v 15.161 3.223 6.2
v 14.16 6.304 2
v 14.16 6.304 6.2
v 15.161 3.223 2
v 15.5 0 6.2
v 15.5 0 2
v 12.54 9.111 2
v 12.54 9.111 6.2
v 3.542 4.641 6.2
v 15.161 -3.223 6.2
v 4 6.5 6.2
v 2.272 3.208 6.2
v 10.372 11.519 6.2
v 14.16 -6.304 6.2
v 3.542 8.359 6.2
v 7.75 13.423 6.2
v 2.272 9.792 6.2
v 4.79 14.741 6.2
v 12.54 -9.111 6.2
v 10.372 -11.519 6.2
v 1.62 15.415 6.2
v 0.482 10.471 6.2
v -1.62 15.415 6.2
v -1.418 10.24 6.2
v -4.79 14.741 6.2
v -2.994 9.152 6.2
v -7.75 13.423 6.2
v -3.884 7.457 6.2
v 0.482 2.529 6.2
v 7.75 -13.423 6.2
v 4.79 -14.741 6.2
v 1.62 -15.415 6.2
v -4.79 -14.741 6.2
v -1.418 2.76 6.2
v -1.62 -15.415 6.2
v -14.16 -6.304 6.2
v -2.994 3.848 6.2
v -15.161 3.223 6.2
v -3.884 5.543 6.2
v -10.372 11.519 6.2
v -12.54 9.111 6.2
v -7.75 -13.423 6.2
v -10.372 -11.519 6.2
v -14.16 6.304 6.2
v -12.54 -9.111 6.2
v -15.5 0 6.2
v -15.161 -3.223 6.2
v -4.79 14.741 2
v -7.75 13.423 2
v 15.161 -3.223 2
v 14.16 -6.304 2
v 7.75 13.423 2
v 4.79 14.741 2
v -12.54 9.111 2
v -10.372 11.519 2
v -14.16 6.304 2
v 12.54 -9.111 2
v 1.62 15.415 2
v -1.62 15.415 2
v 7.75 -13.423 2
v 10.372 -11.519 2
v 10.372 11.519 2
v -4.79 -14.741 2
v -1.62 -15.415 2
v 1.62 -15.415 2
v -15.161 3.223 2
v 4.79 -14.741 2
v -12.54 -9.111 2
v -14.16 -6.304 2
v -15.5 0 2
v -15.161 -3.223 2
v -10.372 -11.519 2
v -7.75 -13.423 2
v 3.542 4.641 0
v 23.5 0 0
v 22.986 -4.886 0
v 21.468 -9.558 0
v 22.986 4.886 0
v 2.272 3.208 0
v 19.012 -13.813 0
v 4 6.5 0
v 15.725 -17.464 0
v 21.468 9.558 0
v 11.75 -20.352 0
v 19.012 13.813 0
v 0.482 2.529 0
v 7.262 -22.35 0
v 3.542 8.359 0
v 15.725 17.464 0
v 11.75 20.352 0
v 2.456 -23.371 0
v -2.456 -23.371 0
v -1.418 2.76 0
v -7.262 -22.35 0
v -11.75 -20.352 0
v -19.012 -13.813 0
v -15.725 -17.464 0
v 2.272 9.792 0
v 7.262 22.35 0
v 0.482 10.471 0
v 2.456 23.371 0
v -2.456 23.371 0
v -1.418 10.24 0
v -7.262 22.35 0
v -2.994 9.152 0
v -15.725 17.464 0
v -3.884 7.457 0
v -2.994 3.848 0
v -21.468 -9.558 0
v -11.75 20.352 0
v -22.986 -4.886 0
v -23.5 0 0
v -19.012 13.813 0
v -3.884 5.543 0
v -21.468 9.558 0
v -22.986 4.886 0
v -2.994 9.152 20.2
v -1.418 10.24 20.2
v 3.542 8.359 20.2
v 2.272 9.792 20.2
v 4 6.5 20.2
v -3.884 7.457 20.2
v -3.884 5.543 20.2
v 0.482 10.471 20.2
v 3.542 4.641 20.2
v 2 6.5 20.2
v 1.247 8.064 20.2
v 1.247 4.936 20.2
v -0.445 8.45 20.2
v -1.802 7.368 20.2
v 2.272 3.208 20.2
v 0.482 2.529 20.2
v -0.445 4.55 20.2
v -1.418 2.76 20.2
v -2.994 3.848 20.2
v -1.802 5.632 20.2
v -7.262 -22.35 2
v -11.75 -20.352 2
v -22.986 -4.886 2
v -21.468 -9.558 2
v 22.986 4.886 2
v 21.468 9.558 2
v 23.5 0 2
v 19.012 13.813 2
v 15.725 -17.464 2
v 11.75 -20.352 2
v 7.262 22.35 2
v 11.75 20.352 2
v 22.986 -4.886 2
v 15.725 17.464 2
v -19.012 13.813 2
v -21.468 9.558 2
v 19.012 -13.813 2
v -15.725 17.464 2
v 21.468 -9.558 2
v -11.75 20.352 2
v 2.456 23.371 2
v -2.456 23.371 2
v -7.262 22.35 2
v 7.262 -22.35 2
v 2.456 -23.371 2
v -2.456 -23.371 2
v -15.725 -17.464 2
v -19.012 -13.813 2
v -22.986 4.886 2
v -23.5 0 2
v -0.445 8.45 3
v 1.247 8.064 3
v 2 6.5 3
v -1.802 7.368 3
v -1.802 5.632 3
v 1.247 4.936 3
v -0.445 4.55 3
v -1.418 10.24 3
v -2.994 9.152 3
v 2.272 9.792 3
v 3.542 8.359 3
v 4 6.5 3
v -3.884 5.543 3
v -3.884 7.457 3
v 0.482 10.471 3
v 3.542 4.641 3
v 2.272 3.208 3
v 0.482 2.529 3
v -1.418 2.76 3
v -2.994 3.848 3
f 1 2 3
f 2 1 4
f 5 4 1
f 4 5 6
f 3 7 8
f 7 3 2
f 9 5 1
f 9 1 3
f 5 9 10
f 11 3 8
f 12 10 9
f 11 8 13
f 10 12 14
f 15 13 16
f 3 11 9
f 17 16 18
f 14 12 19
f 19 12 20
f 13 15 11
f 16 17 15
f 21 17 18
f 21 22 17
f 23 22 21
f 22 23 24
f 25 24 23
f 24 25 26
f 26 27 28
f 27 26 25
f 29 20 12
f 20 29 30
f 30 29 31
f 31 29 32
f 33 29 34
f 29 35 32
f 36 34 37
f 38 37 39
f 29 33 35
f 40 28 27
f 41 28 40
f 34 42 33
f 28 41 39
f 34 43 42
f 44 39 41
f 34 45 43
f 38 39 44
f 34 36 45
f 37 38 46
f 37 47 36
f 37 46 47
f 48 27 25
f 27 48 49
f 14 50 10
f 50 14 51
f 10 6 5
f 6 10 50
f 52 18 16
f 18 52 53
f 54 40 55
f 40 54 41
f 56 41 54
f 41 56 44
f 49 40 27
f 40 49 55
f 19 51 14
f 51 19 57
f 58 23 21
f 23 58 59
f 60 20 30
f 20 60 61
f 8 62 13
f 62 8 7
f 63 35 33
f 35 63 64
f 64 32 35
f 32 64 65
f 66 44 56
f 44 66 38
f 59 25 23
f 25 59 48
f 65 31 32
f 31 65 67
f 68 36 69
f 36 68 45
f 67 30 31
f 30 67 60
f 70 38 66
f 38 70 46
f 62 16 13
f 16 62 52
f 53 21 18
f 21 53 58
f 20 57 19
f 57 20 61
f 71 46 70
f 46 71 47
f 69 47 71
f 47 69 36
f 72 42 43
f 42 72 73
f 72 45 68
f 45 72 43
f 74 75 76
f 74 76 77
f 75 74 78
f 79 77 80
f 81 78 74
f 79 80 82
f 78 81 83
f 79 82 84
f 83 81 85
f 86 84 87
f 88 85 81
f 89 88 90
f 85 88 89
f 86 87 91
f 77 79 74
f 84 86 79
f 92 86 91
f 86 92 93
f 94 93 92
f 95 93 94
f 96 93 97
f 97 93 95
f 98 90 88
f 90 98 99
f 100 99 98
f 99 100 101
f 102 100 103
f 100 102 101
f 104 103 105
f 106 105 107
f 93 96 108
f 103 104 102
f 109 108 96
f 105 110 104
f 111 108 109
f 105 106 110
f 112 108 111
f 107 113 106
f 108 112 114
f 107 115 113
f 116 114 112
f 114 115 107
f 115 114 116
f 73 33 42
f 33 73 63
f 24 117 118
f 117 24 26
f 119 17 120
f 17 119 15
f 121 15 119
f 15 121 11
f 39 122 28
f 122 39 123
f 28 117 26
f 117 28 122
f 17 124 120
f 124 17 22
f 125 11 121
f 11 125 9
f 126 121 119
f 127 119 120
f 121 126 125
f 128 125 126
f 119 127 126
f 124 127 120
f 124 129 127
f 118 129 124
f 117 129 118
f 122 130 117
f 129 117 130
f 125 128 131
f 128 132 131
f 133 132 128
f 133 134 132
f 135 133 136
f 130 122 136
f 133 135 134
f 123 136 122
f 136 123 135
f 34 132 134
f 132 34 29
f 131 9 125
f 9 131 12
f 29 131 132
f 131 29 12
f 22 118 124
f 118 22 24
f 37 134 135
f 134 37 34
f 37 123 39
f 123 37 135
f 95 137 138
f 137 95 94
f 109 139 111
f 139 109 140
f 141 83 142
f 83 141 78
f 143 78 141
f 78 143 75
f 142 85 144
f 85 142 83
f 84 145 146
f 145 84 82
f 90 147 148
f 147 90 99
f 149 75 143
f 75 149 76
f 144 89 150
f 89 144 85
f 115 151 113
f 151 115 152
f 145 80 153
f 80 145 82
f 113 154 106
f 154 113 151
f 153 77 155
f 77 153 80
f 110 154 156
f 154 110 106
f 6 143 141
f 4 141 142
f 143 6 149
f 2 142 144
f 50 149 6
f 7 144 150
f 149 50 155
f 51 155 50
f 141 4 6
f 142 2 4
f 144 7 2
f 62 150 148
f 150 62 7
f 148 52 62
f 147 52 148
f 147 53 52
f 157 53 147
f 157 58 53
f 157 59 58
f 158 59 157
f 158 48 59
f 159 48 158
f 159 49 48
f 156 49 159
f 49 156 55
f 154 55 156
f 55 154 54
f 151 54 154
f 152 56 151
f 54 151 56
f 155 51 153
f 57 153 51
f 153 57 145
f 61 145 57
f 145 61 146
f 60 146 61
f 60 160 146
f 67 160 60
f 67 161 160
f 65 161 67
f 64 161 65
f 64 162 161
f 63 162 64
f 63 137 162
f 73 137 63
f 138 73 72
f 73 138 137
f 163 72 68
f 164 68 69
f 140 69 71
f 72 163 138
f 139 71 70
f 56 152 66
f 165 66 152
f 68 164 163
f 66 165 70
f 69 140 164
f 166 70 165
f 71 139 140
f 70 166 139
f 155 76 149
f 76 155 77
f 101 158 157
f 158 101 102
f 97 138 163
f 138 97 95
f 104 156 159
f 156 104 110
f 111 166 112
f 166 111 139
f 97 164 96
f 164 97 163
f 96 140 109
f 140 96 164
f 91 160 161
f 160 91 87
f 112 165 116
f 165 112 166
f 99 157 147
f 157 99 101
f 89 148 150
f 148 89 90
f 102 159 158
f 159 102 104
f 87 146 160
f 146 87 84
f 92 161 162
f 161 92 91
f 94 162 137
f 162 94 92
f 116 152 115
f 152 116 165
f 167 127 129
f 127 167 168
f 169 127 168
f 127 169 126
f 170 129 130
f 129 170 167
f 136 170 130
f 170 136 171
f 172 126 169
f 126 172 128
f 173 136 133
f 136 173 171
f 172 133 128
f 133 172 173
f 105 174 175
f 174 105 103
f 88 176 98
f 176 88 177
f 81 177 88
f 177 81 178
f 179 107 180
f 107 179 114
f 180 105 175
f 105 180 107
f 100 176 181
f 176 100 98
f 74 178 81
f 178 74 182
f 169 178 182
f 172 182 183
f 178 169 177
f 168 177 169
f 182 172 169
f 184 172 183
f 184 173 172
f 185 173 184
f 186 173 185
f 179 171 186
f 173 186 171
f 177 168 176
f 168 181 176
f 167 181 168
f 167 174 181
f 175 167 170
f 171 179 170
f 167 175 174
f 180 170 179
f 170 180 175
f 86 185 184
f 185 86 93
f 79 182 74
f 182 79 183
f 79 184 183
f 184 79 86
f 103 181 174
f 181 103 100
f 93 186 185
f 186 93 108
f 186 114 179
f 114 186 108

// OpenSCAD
module brooch_inner_plate() {
    difference() {
        union() {
            cylinder( h=6.2, d=31 );
            translate( [0, 6.5, 6.2] ) {
                cylinder( h=14, d=8 );
            }
            cylinder( h=2, d=47 );
        }
        translate( [0, 6.5, 0] ) {
            cylinder( h=20.2, d=4 );
        }
        translate( [0, 6.5, 0] ) {
            cylinder( h=3, d=8 );
        }
    }
}

brooch_inner_plate();
